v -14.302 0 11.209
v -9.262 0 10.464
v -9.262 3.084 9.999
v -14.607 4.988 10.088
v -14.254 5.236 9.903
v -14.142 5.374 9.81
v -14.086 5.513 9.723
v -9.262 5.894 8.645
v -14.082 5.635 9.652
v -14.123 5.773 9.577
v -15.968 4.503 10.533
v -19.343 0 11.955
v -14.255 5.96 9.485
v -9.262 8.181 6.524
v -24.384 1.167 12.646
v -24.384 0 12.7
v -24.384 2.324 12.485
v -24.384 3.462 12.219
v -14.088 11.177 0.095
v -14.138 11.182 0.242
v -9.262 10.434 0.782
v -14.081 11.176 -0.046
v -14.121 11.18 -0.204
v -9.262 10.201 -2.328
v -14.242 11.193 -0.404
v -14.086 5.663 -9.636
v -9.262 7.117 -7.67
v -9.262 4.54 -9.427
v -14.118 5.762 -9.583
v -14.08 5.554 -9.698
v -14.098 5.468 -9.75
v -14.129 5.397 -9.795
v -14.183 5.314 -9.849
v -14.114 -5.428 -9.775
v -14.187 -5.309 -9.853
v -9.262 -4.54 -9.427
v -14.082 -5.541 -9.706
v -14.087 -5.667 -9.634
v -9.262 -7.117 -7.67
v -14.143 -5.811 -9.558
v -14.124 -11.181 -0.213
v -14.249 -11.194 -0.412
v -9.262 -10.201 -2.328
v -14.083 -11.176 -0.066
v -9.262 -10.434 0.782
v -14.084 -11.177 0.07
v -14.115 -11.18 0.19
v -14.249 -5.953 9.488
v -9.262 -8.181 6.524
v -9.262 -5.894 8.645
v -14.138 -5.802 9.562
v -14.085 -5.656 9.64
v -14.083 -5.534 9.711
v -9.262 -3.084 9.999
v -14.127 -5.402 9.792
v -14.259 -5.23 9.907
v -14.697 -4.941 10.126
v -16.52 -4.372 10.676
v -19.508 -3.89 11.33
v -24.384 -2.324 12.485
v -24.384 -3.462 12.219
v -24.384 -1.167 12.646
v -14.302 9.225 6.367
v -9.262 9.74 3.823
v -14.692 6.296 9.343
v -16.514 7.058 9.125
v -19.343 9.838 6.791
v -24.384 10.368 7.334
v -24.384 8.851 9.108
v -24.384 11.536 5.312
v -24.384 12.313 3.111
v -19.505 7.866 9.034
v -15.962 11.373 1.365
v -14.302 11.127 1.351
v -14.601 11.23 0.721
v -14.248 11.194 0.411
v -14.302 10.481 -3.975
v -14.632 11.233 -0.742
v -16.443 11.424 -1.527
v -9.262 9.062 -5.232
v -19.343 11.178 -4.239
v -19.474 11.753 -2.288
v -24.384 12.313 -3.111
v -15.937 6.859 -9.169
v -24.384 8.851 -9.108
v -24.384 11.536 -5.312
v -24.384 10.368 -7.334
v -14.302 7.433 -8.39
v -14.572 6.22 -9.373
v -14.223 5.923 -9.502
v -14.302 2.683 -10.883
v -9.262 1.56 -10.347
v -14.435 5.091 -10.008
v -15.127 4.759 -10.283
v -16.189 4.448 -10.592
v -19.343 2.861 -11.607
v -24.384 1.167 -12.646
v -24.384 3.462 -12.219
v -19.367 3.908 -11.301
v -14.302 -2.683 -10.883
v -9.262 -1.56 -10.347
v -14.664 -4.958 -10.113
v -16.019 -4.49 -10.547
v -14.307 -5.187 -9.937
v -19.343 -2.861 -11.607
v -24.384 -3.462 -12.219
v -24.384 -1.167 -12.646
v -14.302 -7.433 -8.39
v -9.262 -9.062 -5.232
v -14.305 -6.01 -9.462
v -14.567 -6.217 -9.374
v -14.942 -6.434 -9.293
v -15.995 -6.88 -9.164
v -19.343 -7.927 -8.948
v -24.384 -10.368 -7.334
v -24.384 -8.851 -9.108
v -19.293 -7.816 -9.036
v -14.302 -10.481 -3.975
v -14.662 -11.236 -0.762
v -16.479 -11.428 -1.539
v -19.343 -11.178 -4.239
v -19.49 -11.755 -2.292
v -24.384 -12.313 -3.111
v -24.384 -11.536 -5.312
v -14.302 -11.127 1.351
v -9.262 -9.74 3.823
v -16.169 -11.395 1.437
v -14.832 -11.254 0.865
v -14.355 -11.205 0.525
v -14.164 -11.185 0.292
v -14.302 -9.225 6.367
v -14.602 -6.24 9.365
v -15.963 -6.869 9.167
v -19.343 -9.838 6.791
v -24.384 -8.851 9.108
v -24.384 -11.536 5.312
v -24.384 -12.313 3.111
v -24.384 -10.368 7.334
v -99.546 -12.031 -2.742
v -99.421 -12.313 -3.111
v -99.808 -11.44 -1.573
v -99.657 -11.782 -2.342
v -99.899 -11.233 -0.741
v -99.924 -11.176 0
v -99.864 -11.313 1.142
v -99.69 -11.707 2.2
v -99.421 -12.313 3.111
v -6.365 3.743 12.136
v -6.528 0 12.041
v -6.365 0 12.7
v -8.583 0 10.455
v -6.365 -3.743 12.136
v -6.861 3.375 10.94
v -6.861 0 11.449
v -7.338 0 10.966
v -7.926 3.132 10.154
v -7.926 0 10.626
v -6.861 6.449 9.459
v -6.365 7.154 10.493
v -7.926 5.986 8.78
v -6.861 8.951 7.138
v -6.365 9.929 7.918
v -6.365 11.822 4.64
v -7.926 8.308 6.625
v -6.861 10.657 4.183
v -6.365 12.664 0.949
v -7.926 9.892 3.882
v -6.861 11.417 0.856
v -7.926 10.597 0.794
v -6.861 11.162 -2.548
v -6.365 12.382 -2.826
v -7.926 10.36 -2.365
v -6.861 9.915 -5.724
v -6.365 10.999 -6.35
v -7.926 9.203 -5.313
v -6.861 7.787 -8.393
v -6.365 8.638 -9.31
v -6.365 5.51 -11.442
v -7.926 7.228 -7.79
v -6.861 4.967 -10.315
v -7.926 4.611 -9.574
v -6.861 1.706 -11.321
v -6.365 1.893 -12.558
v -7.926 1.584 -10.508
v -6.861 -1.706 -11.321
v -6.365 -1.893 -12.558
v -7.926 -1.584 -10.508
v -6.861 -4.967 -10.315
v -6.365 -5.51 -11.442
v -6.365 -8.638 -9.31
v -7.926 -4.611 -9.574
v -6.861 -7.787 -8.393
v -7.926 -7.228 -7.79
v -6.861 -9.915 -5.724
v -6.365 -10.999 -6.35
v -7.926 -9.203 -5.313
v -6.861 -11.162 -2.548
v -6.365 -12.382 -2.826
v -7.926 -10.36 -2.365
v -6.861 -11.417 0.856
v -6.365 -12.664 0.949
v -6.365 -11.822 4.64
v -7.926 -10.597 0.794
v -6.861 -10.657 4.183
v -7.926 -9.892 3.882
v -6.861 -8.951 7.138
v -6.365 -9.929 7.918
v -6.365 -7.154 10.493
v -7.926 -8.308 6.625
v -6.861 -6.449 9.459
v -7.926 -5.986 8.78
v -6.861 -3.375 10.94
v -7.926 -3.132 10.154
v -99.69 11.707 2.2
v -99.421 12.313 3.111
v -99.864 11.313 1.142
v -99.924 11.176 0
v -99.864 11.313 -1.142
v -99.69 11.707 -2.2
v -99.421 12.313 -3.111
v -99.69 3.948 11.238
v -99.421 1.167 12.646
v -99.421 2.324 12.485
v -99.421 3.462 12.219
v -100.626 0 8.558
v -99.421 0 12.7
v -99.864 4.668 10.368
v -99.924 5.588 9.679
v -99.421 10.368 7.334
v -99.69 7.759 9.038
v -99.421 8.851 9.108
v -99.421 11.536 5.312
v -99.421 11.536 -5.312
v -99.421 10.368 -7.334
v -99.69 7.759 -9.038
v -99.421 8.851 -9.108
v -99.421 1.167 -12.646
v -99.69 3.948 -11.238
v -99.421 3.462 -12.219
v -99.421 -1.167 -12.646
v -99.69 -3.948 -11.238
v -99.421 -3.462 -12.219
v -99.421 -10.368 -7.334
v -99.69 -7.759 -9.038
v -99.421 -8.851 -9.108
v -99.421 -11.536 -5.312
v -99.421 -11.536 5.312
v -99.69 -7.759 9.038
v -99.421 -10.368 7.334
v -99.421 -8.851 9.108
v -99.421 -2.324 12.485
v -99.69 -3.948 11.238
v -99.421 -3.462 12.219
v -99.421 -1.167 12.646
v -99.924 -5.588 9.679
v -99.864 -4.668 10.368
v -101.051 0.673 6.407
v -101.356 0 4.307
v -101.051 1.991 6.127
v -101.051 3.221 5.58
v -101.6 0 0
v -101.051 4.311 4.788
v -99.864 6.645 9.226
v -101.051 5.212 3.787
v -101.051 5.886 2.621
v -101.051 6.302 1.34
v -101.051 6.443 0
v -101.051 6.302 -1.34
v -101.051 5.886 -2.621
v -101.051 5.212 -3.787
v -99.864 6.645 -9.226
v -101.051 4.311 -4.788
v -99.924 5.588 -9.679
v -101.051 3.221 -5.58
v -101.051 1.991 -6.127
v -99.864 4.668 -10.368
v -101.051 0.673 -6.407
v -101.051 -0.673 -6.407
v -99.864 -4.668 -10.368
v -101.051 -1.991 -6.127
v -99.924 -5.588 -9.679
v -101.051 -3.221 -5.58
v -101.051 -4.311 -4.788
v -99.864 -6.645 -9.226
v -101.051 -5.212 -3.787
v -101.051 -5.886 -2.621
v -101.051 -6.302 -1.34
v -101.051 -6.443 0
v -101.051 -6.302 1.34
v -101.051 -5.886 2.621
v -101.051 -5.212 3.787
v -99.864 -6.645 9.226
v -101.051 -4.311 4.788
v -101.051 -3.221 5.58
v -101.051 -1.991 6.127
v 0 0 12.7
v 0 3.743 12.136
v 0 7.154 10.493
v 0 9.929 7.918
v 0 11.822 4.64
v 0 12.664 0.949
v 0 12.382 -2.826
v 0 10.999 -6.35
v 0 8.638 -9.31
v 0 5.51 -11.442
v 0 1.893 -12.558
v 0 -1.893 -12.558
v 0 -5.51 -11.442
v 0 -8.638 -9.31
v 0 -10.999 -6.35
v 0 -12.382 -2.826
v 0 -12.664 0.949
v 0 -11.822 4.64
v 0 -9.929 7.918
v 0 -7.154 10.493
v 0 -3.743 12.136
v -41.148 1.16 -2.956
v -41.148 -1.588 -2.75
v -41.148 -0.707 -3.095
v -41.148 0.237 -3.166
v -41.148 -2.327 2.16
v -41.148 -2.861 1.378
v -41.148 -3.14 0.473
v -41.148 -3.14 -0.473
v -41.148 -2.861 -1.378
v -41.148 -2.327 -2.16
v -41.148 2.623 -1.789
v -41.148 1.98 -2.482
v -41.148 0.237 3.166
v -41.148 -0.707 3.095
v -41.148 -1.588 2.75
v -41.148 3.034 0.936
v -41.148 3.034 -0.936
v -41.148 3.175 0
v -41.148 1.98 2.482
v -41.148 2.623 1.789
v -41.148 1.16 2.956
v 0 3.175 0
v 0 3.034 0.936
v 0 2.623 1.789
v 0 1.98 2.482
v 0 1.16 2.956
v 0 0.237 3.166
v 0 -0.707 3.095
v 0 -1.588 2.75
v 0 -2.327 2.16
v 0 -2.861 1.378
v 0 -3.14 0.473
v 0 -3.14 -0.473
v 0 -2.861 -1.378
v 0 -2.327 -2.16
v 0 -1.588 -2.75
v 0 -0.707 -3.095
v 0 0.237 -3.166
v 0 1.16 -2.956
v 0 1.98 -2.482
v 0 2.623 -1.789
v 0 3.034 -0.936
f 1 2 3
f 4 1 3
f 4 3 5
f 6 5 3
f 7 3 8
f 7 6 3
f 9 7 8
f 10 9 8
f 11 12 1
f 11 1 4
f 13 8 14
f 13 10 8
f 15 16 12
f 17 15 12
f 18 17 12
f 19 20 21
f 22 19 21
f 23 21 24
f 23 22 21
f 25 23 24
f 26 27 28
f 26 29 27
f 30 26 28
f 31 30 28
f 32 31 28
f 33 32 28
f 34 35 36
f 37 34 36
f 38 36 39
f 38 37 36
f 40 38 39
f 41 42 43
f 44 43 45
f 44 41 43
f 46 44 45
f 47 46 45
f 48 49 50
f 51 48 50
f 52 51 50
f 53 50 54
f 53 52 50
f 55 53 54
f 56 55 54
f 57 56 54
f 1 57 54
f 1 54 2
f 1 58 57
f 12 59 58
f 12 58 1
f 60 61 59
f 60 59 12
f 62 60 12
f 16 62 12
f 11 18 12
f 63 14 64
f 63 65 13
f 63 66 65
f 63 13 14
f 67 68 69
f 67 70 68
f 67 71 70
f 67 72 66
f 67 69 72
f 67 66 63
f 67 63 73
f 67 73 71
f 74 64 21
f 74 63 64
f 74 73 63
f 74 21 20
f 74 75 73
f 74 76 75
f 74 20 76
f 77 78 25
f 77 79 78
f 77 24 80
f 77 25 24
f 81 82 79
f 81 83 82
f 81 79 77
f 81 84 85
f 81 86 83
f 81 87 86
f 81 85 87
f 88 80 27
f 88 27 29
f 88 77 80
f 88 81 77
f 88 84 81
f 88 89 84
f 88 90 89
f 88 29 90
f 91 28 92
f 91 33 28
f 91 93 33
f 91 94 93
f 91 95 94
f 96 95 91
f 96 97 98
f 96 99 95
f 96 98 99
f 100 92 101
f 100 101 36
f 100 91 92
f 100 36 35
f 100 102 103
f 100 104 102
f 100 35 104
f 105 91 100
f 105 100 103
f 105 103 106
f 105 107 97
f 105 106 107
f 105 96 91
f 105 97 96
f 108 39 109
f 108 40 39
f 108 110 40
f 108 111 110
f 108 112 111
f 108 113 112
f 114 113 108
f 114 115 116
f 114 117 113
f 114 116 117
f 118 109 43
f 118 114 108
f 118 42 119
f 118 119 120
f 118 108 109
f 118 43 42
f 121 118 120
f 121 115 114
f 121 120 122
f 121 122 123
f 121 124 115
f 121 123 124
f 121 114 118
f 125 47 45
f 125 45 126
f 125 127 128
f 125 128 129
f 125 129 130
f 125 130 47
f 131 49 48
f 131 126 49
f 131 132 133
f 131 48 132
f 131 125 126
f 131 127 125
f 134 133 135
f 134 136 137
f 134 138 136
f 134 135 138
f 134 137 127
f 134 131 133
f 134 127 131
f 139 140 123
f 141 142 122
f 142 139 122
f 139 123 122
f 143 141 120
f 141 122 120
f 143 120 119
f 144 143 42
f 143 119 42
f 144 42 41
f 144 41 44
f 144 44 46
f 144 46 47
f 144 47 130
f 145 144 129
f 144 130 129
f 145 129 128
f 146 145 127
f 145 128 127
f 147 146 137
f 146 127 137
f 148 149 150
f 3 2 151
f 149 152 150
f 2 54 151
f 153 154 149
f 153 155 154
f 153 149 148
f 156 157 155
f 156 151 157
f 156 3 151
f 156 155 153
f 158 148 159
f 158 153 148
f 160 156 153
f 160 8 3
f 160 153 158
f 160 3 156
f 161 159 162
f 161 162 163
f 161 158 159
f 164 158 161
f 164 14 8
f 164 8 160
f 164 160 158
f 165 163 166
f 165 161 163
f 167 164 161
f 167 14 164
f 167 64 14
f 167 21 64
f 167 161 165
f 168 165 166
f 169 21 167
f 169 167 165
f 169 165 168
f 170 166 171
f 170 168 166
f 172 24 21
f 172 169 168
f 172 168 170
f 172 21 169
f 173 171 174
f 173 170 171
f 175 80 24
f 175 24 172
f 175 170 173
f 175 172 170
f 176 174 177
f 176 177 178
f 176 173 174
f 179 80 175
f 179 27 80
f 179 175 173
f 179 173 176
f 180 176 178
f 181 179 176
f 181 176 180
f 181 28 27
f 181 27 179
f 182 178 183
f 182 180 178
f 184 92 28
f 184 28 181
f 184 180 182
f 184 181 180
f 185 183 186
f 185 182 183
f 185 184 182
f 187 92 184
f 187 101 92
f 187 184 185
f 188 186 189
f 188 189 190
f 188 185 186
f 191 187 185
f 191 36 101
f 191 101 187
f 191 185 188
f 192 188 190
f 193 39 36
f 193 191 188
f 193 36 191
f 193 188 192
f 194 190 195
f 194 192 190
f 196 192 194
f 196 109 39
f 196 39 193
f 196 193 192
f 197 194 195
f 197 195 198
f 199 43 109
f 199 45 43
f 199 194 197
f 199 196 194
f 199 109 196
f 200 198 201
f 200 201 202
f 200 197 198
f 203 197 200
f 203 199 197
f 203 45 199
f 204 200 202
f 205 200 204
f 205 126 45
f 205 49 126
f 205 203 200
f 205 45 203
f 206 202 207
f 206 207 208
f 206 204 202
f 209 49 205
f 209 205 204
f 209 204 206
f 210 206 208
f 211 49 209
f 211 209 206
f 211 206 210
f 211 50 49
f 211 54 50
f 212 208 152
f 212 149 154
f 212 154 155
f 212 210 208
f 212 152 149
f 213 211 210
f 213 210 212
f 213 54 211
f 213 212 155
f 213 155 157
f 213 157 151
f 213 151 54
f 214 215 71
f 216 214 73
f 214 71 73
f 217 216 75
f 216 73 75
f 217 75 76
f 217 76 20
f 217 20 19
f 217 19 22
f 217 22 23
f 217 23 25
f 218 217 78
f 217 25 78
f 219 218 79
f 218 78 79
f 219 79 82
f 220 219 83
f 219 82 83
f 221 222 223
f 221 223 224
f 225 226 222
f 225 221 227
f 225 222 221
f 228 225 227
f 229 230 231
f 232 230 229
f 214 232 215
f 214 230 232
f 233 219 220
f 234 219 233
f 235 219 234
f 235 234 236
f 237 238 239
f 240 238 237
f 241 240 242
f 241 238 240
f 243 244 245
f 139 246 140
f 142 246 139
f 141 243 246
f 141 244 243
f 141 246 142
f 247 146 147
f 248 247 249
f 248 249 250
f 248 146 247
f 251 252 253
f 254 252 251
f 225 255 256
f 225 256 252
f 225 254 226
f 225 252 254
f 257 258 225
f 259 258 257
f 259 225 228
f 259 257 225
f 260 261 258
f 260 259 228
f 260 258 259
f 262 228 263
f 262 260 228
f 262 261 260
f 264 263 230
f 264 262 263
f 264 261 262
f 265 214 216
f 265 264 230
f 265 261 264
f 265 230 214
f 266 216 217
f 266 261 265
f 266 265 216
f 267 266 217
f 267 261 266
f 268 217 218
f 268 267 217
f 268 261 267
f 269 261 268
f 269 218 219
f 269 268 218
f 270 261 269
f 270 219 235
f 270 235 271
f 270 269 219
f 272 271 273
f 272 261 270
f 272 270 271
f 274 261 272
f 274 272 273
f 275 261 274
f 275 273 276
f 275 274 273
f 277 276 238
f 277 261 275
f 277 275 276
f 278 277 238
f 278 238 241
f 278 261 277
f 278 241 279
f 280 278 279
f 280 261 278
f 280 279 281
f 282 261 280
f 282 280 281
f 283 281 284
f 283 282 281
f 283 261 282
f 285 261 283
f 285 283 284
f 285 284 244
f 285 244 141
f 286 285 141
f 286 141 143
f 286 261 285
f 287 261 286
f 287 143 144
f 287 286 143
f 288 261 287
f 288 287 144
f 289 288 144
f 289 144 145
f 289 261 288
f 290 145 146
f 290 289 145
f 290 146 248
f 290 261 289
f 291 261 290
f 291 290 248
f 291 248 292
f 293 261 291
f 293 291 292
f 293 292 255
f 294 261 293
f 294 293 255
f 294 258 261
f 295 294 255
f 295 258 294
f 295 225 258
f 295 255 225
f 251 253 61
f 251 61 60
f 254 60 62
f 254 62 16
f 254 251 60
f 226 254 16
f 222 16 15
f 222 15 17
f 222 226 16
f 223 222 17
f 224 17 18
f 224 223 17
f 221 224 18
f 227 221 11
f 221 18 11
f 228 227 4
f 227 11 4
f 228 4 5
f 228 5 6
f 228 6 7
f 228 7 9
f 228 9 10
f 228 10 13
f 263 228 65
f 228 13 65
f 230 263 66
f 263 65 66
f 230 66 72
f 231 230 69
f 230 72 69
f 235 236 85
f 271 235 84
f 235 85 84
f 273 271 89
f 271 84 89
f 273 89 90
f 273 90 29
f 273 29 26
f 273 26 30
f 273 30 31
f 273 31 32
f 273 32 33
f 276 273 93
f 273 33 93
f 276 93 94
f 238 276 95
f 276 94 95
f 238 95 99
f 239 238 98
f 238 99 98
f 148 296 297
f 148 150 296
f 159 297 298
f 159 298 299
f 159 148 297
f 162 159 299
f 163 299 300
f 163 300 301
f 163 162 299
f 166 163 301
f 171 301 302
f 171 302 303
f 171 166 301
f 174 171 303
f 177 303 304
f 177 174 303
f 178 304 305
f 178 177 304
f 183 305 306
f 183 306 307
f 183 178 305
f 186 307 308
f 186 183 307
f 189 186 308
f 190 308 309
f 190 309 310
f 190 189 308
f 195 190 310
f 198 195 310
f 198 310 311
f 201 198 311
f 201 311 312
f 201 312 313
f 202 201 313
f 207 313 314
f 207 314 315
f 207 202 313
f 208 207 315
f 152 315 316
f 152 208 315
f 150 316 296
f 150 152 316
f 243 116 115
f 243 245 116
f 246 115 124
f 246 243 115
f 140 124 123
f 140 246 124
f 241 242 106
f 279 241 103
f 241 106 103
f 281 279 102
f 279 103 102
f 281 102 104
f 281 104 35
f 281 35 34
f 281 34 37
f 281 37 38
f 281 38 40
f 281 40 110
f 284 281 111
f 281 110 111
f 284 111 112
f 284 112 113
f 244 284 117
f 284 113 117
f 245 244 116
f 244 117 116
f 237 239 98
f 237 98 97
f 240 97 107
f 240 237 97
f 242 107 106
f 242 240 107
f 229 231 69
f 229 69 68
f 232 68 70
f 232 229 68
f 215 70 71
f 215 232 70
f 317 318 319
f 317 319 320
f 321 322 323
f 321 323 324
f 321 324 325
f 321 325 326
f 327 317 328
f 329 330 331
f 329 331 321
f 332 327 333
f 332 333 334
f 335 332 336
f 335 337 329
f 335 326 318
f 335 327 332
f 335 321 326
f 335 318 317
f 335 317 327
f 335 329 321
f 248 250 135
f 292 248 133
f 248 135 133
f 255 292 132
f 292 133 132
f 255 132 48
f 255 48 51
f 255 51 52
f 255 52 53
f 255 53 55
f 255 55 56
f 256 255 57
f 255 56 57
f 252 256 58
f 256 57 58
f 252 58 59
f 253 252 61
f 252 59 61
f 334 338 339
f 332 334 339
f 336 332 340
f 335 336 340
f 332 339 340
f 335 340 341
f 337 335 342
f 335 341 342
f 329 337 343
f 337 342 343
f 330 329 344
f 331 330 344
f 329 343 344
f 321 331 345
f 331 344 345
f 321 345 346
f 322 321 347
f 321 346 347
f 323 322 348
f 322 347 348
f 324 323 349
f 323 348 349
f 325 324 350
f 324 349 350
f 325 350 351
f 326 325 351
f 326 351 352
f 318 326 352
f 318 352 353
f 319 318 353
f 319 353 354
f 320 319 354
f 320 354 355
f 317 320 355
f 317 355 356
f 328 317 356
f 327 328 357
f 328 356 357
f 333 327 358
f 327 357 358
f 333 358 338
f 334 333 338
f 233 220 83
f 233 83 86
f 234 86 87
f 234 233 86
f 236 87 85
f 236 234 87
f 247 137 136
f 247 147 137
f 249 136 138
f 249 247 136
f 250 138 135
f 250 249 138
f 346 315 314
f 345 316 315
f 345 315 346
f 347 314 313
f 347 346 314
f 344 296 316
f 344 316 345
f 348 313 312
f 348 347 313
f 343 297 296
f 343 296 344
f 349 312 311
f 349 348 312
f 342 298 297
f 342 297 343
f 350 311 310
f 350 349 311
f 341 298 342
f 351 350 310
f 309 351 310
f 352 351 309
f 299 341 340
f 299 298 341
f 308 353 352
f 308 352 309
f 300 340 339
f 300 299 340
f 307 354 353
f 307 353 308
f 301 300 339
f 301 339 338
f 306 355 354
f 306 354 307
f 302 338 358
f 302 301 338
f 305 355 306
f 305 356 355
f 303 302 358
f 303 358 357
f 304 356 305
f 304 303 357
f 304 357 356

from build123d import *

# Parameters (mm, degrees)
F3_START = -8.89
F2_R     = 4.826
F3_DEPTH = 92.71
F4_R     = 3.175
F5_DEPTH = 41.148


with BuildPart() as f1:
    # F0 (on Front) → F1 (revolve)
    with BuildSketch(Plane.XZ):
        with BuildLine():
            Line((-6.35, 0), (0, 0))
            Line((0, 0), (0, 12.7))
            Line((0, 12.7), (-6.35, 12.7))
            Line((-6.35, 12.7), (-6.3650681608, 12.7))
            ThreePointArc((-6.3650681608, 12.7), (-7.3377104297, 10.9657874542), (-9.2615922964, 10.4635875931))
            Line((-9.2615922964, 10.4635875931), (-24.384, 12.7))
            Line((-24.384, 12.7), (-33.274, 12.7))
            Line((-33.274, 12.7), (-60.9909756098, 12.7))
            Line((-60.9909756098, 12.7), (-69.8809756098, 12.7))
            Line((-69.8809756098, 12.7), (-99.4210244843, 12.7))
            ThreePointArc((-99.4210244843, 12.7), (-101.0513051228, 6.4427853895), (-101.6, 0))
            Line((-101.6, 0), (-6.35, 0))
        make_face()
    revolve(axis=Axis((-50.8, 0, 0), (-1, 0, 0)))

    # F2 (on Right) → F3 (cut)
    with BuildSketch(Plane.YZ.offset(F3_START)):
        with Locations((-16.002, 0)):
            Circle(F2_R)
        with Locations((-8.001, 13.8581385114)):
            Circle(F2_R)
        with Locations((8.001, 13.8581385114)):
            Circle(F2_R)
        with Locations((16.002, 0)):
            Circle(F2_R)
        with Locations((8.001, -13.8581385114)):
            Circle(F2_R)
        with Locations((-8.001, -13.8581385114)):
            Circle(F2_R)
    extrude(amount=-F3_DEPTH, mode=Mode.SUBTRACT)

    # F4 (on Right) → F5 (cut)
    with BuildSketch(Plane.YZ):
        Circle(F4_R)
    extrude(amount=-F5_DEPTH, mode=Mode.SUBTRACT)


solid = f1.part
